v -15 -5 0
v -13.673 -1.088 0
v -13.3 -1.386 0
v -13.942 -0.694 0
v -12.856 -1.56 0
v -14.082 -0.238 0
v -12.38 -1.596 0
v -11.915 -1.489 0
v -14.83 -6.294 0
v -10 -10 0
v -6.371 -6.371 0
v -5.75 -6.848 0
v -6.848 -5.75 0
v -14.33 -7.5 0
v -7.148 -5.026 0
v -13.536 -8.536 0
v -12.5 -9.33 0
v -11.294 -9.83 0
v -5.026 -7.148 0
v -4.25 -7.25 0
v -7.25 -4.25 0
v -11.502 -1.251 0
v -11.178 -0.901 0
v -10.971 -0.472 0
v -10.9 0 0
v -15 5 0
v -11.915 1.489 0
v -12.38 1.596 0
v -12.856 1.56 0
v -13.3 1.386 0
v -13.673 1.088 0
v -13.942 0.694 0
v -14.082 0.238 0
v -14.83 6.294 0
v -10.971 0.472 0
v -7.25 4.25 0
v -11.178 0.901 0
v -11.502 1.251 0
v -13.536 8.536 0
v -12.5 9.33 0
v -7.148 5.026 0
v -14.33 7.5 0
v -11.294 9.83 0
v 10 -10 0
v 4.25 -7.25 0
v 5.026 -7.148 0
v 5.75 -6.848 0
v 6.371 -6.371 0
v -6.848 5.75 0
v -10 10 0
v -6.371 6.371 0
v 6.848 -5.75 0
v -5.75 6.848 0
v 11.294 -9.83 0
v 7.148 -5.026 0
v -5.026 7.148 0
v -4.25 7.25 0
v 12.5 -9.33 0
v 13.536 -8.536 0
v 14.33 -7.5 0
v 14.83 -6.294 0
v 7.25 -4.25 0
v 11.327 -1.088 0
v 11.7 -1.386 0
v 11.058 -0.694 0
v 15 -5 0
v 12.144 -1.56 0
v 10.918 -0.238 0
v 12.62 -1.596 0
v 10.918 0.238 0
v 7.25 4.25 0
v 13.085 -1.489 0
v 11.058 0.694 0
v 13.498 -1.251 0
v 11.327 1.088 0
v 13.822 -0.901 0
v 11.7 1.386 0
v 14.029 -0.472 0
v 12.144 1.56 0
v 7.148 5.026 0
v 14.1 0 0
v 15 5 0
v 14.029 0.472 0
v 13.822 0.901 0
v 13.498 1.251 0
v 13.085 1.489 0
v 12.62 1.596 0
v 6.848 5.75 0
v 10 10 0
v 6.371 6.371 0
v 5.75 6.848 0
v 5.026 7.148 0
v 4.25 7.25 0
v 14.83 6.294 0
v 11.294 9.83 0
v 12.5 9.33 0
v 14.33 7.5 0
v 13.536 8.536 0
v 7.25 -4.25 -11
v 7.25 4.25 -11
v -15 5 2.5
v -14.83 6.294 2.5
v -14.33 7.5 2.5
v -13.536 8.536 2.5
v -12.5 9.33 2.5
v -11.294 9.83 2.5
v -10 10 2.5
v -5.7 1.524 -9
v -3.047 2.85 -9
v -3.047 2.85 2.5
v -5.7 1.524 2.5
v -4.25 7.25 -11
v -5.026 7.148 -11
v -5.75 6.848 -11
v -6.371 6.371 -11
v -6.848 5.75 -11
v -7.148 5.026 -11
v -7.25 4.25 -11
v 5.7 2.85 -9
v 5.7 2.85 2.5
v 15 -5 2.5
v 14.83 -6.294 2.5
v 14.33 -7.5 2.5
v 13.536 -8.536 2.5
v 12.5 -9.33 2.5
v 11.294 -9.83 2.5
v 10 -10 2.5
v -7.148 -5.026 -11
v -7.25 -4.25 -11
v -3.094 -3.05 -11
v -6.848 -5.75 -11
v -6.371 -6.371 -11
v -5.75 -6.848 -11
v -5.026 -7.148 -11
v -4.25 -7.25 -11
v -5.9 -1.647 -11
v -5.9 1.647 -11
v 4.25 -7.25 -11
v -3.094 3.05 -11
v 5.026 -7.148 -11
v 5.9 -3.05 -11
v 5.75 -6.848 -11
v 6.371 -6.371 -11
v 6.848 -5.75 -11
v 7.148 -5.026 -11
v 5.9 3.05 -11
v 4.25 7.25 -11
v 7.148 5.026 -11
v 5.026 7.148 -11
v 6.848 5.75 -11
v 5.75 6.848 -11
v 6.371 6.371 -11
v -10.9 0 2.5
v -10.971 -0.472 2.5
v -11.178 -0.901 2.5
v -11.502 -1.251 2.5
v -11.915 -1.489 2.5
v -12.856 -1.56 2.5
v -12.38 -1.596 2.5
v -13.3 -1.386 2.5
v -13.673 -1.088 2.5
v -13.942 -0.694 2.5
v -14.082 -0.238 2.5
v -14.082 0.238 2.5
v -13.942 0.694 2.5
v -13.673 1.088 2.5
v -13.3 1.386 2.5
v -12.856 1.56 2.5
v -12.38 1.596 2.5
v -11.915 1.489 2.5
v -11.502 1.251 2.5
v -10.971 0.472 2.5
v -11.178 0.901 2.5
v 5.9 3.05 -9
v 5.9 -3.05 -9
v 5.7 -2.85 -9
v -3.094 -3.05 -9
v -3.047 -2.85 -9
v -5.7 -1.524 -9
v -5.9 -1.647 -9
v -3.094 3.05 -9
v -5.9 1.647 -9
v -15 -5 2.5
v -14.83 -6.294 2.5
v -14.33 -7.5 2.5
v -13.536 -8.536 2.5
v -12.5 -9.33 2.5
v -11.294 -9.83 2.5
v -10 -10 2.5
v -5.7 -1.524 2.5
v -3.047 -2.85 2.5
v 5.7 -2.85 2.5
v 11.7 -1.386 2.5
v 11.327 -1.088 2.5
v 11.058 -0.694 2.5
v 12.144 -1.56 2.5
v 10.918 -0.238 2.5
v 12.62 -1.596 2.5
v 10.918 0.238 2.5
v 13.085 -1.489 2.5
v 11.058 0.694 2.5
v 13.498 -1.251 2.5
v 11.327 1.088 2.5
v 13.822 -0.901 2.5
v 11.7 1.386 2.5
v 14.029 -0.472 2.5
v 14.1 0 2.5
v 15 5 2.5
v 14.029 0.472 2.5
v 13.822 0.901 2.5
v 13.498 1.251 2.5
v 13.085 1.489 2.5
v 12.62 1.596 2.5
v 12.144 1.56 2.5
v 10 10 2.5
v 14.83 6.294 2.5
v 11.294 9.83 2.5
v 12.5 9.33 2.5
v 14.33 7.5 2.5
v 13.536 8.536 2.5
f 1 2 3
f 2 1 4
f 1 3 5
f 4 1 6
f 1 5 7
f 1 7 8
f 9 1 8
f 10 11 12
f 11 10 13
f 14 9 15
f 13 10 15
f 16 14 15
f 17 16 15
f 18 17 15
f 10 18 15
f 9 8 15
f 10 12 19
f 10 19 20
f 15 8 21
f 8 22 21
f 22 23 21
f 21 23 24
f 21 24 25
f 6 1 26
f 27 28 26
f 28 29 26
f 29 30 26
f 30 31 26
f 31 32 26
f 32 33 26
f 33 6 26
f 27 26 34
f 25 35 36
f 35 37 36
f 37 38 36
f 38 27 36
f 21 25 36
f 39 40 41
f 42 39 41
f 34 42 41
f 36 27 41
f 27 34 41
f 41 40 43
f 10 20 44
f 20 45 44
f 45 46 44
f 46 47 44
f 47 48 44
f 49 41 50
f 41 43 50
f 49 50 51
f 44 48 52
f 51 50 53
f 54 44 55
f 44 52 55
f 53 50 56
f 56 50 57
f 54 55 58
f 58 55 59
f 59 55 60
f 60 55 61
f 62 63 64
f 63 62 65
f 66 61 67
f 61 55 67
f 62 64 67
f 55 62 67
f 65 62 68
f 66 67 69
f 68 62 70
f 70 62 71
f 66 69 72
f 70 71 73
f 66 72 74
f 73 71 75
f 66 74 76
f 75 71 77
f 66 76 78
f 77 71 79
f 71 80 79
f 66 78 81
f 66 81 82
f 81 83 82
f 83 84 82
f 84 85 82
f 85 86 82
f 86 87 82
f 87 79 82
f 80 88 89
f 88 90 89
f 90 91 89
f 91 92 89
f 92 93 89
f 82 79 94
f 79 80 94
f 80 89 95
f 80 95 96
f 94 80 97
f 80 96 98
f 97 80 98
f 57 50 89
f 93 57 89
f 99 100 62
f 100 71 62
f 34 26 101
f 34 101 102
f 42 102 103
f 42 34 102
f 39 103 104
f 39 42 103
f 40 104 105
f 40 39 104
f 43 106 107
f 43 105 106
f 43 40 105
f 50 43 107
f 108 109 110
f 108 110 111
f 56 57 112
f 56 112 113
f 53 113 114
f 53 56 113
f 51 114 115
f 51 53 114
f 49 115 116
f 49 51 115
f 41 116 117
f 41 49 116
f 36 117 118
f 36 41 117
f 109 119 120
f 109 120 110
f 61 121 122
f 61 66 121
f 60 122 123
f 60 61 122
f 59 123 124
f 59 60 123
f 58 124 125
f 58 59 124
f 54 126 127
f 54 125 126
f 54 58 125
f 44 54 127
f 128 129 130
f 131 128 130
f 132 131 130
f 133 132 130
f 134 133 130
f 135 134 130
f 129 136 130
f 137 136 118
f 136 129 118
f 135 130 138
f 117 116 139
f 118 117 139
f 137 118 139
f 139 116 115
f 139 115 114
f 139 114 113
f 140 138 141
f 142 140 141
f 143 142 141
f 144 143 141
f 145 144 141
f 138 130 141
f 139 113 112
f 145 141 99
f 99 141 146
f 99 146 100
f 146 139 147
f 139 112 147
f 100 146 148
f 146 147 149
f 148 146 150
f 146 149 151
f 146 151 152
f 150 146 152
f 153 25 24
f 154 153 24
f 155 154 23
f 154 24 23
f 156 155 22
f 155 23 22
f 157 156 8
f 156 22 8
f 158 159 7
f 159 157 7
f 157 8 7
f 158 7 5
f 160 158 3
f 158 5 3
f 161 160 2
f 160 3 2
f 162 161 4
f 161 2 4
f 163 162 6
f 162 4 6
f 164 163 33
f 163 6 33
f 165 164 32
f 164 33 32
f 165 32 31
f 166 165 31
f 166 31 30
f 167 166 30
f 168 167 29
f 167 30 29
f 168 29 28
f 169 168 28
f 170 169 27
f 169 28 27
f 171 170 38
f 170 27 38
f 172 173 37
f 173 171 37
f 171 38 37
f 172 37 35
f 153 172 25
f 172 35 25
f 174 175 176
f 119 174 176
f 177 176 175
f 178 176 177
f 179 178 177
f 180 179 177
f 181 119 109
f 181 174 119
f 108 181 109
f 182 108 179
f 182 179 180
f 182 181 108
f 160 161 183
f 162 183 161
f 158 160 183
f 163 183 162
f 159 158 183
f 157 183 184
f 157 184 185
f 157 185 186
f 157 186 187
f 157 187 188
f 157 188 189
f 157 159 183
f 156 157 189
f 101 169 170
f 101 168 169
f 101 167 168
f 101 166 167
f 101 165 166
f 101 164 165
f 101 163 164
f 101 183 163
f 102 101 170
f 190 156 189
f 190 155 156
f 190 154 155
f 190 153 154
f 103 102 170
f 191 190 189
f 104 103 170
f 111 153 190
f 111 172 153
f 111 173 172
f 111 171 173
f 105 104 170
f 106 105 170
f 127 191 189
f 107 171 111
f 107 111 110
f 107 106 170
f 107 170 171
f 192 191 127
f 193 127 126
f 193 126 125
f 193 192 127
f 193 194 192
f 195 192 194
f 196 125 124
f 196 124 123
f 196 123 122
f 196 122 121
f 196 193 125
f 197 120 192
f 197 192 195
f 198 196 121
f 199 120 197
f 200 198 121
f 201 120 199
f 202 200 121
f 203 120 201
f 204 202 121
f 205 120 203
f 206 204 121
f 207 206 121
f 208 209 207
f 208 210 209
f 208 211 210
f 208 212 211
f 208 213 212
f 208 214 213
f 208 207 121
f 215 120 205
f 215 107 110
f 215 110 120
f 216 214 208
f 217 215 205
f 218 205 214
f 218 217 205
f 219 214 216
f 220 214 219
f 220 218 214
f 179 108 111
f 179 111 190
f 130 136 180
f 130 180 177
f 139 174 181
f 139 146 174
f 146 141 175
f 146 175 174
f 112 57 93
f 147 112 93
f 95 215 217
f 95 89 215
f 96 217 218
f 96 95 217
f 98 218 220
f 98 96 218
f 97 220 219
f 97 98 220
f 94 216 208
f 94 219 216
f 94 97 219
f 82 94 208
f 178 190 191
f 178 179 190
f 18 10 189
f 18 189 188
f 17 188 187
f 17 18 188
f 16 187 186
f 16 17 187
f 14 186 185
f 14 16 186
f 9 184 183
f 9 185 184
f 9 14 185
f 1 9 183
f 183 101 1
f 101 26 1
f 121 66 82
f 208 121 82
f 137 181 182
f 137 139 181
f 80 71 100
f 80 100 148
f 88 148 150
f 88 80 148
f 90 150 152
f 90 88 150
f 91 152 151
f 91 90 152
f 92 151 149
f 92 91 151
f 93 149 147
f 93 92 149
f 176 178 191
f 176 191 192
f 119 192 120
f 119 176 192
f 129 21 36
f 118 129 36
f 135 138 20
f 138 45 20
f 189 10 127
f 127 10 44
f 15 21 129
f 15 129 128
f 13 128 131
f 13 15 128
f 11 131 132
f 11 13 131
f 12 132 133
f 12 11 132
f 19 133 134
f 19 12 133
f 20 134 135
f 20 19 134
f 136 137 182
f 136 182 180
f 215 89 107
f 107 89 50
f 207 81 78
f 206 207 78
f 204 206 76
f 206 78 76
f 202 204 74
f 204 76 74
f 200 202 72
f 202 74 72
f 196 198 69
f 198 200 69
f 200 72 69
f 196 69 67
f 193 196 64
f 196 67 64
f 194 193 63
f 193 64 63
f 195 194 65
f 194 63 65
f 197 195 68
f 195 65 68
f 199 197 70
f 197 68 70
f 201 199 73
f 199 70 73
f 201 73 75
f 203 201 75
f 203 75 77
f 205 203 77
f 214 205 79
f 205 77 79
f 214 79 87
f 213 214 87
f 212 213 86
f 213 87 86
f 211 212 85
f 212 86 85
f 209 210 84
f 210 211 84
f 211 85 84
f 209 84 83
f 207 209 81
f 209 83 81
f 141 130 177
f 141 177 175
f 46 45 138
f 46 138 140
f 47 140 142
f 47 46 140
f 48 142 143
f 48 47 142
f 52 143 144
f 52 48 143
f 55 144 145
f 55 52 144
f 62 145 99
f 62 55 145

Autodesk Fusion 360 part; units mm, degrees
sketch "Sketch1" plane through (0, 0, 0) normal (0, 0, 1) x (1, 0, 0)
  line L0 (-4.25, 7.25) -> (4.25, 7.25)
  line L1 (7.25, 4.25) -> (7.25, -4.25)
  line L2 (4.25, -7.25) -> (-4.25, -7.25)
  line L3 (-7.25, -4.25) -> (-7.25, 4.25)
  line L4 (-7.25, 7.25) -> (7.25, -7.25) construction
  line L5 (7.25, 7.25) -> (-7.25, -7.25) construction
  arc A0 (-4.25, 7.25) -> (-7.25, 4.25) centre (-4.25, 4.25) ccw
  arc A1 (-7.25, -4.25) -> (-4.25, -7.25) centre (-4.25, -4.25) ccw
  arc A2 (4.25, -7.25) -> (7.25, -4.25) centre (4.25, -4.25) ccw
  arc A3 (7.25, 4.25) -> (4.25, 7.25) centre (4.25, 4.25) ccw
  line L6 (10, 10) -> (-10, 10)
  line L7 (-15, 5) -> (-15, -5)
  line L8 (-10, -10) -> (10, -10)
  line L9 (15, -5) -> (15, 5)
  line L10 (15, 10) -> (-15, -10) construction
  line L11 (-15, 10) -> (15, -10) construction
  arc A4 (15, 5) -> (10, 10) centre (10, 5) ccw
  arc A5 (-10, 10) -> (-15, 5) centre (-10, 5) ccw
  arc A6 (-15, -5) -> (-10, -10) centre (-10, -5) ccw
  arc A7 (10, -10) -> (15, -5) centre (10, -5) ccw
  circle A8 centre (-12.5, 0) radius 1.6
  line L12 (0, 0) -> (0, 5.6259) construction
  circle A9 centre (12.5, 0) radius 1.6
  line L13 (-5.5, 2.65) -> (5.5, 2.65)
  line L14 (5.5, 2.65) -> (5.5, -2.65)
  line L15 (5.5, -2.65) -> (-5.5, -2.65)
  line L16 (-5.5, -2.65) -> (-5.5, 2.65)
  line L17 (-5.5, 2.65) -> (5.5, -2.65) construction
  line L18 (5.5, 2.65) -> (-5.5, -2.65) construction
  line L19 (-5.5, 1.4) -> (-5.5, -1.4)
  line L20 (-3, 4.4279) -> (-3, -3.4951) construction
  line L21 (-5.5, 1.4) -> (-3, 2.65)
  line L22 (-3, -2.65) -> (-5.5, -1.4)
  dimension "d1" = 14.5
  dimension "d2" = 14.5
  dimension "d3" = 3
  dimension "d4" = 30
  dimension "d5" = 20
  dimension "d6" = 5
  dimension "d7" = 3.2
  dimension "d8" = 11
  dimension "d9" = 5.3
  dimension "d10" = 2.8
  dimension "d11" = 2.5
  dimension "d12" = 1.4
  dimension "d17" = 12.5
extrude "Extrude1" add sketch "Sketch1" along normal blind 2.5 contours L0 L1 L2 L3 A0 A1 A2 A3 | L6 L7 L8 L9 A4 A5 A6 A7 | L13 L16 L21 | L15 L16 L22
extrude "Extrude2" add sketch "Sketch1" against normal blind 11 contours L0 L1 L2 L3 A0 A1 A2 A3 | L13 L16 L21 | L15 L16 L22
sketch "Sketch2" plane through (0, 0, -11) normal (0, 0, -1) x (-1, 0, 0)
  line L0 (5.5, 1.4) -> (5.5, -1.4)
  line L1 (5.5, -1.4) -> (3, -2.65)
  line L2 (3, -2.65) -> (-5.5, -2.65)
  line L3 (-5.5, -2.65) -> (-5.5, 2.65)
  line L4 (-5.5, 2.65) -> (3, 2.65)
  line L5 (3, 2.65) -> (5.5, 1.4)
  arc A0 (-7.25, -4.25) -> (-4.25, -7.25) centre (-4.25, -4.25) ccw
  line L6 (-4.25, -7.25) -> (4.25, -7.25)
  arc A1 (4.25, -7.25) -> (7.25, -4.25) centre (4.25, -4.25) ccw
  line L7 (7.25, -4.25) -> (7.25, 4.25)
  arc A2 (7.25, 4.25) -> (4.25, 7.25) centre (4.25, 4.25) ccw
  line L8 (4.25, 7.25) -> (-4.25, 7.25)
  arc A3 (-4.25, 7.25) -> (-7.25, 4.25) centre (-4.25, 4.25) ccw
  line L9 (-7.25, 4.25) -> (-7.25, -4.25)
  line L10 (5.9, -1.6472) -> (3.0944, -3.05)
  line L11 (3.0944, -3.05) -> (-5.9, -3.05)
  line L12 (-5.9, -3.05) -> (-5.9, 3.05)
  line L13 (-5.9, 3.05) -> (3.0944, 3.05)
  line L14 (3.0944, 3.05) -> (5.9, 1.6472)
  line L15 (5.9, 1.6472) -> (5.9, -1.6472)
  line L16 (5.7, 1.5236) -> (5.7, -1.5236)
  line L17 (5.7, -1.5236) -> (3.0472, -2.85)
  line L18 (3.0472, -2.85) -> (-5.7, -2.85)
  line L19 (-5.7, -2.85) -> (-5.7, 2.85)
  line L20 (-5.7, 2.85) -> (3.0472, 2.85)
  line L21 (3.0472, 2.85) -> (5.7, 1.5236)
  dimension "d18" = -0.4
  dimension "d21" = -0.2
extrude "Extrude3" cut sketch "Sketch2" against normal blind 2 contours L10 L11 L12 L13 L14 L15 | L16 L17 L18 L19 L20 L21
extrude "Extrude4" cut sketch "Sketch2" against normal through all contours L0 L1 L2 L3 L4 L5 | L16 L17 L18 L19 L20 L21
equation "d12 = d10 / 2"
